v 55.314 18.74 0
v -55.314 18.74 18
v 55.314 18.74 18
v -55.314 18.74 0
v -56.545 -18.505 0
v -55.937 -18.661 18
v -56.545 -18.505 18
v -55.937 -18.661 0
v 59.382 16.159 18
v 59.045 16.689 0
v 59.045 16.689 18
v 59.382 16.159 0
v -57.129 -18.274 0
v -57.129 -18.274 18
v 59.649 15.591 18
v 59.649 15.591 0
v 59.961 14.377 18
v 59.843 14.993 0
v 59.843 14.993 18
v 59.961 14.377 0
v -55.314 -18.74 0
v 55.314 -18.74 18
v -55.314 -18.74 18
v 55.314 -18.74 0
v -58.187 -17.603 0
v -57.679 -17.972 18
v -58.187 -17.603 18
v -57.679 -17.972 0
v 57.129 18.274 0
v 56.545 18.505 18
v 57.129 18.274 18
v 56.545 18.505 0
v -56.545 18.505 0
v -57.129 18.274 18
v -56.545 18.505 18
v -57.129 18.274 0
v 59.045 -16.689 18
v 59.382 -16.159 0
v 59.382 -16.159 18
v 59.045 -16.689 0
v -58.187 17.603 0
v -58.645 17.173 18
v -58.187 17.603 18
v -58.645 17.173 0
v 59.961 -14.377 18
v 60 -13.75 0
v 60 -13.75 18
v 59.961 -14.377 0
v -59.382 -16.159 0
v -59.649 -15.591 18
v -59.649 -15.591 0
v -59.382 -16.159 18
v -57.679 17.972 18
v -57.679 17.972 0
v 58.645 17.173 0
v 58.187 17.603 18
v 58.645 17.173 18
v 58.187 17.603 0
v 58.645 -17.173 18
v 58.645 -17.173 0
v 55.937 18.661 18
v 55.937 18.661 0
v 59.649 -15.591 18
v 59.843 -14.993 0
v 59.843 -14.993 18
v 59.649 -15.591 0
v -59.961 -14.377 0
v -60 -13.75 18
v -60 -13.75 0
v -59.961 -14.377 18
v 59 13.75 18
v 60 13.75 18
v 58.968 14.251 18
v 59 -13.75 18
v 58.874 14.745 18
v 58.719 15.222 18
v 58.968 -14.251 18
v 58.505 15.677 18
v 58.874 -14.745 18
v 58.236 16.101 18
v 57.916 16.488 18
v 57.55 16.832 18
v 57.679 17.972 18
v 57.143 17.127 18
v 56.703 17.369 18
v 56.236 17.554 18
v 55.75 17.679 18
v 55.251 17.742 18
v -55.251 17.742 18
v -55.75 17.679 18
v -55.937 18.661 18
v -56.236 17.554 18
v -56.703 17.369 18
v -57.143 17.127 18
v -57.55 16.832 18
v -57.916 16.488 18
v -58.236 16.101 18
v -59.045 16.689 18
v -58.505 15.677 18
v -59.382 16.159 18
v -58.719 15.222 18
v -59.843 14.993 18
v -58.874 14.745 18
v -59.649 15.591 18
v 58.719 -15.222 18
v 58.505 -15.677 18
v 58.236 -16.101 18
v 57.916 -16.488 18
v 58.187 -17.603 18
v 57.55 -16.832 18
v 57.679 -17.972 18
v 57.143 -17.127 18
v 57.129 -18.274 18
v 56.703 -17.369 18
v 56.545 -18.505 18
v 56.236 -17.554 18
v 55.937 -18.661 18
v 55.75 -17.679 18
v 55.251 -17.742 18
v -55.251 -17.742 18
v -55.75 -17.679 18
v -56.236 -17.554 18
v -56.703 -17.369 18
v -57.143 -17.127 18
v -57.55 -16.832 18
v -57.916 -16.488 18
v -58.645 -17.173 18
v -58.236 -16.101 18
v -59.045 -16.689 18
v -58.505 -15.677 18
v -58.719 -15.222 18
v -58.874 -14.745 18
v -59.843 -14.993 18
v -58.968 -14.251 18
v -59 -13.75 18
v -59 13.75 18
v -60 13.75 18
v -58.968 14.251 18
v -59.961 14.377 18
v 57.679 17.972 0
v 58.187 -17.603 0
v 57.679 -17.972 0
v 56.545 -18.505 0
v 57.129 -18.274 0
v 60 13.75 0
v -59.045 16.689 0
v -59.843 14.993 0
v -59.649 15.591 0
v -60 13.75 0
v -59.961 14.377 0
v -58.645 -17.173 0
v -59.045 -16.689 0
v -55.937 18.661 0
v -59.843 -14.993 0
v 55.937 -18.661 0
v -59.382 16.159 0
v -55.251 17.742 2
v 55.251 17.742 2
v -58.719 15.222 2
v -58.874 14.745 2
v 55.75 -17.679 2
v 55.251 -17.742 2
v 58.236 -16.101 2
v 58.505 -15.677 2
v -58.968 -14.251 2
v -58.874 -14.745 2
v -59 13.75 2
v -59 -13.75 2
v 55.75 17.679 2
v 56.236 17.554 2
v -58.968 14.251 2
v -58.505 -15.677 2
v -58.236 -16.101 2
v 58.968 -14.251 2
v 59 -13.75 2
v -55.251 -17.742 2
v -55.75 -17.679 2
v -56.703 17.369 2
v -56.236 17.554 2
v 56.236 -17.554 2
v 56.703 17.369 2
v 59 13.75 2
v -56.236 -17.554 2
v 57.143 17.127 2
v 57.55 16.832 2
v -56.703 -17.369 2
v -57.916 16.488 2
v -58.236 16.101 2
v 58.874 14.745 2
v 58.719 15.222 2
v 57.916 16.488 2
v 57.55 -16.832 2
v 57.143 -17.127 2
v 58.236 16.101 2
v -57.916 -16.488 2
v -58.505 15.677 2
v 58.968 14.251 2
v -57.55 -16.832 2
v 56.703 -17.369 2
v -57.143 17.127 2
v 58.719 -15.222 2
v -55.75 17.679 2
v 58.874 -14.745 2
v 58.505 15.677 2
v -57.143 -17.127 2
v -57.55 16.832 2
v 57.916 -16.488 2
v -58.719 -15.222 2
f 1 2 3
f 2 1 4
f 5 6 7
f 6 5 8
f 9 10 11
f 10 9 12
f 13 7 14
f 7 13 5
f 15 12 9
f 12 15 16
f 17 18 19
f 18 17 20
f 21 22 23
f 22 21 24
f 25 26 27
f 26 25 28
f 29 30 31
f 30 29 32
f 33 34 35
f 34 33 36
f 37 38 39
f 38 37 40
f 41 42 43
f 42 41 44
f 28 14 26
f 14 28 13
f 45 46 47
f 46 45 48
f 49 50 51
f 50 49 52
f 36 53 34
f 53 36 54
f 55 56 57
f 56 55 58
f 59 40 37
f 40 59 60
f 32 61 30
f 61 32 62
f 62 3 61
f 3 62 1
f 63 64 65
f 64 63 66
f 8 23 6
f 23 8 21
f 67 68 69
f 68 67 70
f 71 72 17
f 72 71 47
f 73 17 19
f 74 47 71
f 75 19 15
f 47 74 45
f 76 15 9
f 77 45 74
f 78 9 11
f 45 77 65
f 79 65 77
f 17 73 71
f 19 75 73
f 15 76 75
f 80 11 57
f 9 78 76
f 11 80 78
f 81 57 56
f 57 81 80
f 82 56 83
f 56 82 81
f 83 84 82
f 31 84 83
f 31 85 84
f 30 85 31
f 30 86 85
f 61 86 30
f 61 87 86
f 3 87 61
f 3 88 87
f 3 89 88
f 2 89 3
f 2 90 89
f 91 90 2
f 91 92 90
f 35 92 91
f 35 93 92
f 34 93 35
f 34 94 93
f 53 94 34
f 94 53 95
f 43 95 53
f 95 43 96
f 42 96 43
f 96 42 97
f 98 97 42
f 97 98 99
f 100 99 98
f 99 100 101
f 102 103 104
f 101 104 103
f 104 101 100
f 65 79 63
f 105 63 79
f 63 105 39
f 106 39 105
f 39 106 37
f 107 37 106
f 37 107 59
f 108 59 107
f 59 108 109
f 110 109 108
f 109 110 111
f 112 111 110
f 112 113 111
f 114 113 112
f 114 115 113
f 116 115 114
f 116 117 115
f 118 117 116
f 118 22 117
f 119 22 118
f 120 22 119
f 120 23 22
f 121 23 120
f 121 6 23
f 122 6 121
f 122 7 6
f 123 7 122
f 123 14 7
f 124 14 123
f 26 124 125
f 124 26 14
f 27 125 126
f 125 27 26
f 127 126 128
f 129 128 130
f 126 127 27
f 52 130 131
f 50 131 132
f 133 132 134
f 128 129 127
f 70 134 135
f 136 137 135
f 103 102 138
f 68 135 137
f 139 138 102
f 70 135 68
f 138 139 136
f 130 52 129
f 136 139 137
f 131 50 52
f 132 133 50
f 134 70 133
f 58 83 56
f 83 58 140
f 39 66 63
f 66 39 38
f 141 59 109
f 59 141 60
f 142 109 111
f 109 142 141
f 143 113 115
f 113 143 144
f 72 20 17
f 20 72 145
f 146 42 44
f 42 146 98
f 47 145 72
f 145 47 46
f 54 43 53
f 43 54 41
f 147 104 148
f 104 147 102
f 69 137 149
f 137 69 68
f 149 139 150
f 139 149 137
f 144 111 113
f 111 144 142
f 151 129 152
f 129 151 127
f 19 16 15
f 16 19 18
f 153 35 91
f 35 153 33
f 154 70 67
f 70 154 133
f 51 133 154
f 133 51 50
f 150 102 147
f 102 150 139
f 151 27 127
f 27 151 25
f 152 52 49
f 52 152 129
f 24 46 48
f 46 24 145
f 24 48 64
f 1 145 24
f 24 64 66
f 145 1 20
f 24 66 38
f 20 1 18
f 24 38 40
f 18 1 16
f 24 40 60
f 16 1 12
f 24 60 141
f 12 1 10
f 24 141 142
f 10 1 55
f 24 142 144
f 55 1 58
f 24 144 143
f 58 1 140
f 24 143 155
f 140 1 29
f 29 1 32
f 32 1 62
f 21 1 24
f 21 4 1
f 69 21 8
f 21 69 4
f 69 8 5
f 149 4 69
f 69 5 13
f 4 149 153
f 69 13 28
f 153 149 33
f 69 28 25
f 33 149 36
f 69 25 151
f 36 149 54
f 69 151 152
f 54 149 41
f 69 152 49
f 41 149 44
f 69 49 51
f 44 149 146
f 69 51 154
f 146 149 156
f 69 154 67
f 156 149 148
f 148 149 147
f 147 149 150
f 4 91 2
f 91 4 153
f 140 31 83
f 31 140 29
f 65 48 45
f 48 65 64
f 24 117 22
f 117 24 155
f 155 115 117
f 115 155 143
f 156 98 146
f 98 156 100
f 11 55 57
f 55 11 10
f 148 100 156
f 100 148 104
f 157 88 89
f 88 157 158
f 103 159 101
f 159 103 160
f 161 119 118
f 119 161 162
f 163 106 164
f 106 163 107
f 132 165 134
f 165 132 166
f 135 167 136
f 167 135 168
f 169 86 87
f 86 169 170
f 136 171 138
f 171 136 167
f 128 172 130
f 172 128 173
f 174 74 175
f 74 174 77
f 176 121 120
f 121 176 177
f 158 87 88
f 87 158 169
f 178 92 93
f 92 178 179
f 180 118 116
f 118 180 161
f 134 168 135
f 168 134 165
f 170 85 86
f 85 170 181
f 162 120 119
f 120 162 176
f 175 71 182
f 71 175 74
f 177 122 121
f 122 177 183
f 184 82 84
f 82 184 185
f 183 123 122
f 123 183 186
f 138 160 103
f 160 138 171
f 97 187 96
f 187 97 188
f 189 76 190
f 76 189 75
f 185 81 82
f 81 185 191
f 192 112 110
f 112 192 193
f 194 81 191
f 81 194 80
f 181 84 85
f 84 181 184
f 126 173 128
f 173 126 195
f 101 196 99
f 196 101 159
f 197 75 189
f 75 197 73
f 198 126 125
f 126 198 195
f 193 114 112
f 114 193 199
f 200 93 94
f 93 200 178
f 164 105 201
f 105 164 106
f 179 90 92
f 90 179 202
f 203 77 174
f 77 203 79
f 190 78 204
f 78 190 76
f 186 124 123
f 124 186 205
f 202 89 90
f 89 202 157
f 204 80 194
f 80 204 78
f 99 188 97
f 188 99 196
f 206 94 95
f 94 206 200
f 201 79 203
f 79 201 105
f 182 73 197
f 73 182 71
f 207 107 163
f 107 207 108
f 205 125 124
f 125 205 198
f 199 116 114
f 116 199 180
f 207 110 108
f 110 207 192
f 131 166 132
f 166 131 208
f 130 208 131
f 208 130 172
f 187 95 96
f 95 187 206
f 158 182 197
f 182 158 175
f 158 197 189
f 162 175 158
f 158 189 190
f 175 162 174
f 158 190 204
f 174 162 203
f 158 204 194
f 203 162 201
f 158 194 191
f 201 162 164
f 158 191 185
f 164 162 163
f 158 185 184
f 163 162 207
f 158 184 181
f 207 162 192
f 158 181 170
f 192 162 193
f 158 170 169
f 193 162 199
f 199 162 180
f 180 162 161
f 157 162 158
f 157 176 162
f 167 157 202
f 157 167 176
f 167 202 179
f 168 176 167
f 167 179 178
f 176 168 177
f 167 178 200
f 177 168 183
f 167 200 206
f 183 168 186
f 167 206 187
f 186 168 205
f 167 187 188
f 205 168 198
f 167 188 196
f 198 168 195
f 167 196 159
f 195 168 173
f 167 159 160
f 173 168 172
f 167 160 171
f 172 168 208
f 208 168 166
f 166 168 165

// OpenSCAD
$fn = 50;


difference() {
	union() {
		hull() {
			translate(v = [-55.0000000000, 13.7500000000, 0]) {
				cylinder(h = 18, r = 5);
			}
			translate(v = [55.0000000000, 13.7500000000, 0]) {
				cylinder(h = 18, r = 5);
			}
			translate(v = [-55.0000000000, -13.7500000000, 0]) {
				cylinder(h = 18, r = 5);
			}
			translate(v = [55.0000000000, -13.7500000000, 0]) {
				cylinder(h = 18, r = 5);
			}
		}
	}
	union() {
		translate(v = [0, 0, 2]) {
			hull() {
				translate(v = [-55.0000000000, 13.7500000000, 0]) {
					cylinder(h = 16, r = 4);
				}
				translate(v = [55.0000000000, 13.7500000000, 0]) {
					cylinder(h = 16, r = 4);
				}
				translate(v = [-55.0000000000, -13.7500000000, 0]) {
					cylinder(h = 16, r = 4);
				}
				translate(v = [55.0000000000, -13.7500000000, 0]) {
					cylinder(h = 16, r = 4);
				}
			}
		}
	}
}
